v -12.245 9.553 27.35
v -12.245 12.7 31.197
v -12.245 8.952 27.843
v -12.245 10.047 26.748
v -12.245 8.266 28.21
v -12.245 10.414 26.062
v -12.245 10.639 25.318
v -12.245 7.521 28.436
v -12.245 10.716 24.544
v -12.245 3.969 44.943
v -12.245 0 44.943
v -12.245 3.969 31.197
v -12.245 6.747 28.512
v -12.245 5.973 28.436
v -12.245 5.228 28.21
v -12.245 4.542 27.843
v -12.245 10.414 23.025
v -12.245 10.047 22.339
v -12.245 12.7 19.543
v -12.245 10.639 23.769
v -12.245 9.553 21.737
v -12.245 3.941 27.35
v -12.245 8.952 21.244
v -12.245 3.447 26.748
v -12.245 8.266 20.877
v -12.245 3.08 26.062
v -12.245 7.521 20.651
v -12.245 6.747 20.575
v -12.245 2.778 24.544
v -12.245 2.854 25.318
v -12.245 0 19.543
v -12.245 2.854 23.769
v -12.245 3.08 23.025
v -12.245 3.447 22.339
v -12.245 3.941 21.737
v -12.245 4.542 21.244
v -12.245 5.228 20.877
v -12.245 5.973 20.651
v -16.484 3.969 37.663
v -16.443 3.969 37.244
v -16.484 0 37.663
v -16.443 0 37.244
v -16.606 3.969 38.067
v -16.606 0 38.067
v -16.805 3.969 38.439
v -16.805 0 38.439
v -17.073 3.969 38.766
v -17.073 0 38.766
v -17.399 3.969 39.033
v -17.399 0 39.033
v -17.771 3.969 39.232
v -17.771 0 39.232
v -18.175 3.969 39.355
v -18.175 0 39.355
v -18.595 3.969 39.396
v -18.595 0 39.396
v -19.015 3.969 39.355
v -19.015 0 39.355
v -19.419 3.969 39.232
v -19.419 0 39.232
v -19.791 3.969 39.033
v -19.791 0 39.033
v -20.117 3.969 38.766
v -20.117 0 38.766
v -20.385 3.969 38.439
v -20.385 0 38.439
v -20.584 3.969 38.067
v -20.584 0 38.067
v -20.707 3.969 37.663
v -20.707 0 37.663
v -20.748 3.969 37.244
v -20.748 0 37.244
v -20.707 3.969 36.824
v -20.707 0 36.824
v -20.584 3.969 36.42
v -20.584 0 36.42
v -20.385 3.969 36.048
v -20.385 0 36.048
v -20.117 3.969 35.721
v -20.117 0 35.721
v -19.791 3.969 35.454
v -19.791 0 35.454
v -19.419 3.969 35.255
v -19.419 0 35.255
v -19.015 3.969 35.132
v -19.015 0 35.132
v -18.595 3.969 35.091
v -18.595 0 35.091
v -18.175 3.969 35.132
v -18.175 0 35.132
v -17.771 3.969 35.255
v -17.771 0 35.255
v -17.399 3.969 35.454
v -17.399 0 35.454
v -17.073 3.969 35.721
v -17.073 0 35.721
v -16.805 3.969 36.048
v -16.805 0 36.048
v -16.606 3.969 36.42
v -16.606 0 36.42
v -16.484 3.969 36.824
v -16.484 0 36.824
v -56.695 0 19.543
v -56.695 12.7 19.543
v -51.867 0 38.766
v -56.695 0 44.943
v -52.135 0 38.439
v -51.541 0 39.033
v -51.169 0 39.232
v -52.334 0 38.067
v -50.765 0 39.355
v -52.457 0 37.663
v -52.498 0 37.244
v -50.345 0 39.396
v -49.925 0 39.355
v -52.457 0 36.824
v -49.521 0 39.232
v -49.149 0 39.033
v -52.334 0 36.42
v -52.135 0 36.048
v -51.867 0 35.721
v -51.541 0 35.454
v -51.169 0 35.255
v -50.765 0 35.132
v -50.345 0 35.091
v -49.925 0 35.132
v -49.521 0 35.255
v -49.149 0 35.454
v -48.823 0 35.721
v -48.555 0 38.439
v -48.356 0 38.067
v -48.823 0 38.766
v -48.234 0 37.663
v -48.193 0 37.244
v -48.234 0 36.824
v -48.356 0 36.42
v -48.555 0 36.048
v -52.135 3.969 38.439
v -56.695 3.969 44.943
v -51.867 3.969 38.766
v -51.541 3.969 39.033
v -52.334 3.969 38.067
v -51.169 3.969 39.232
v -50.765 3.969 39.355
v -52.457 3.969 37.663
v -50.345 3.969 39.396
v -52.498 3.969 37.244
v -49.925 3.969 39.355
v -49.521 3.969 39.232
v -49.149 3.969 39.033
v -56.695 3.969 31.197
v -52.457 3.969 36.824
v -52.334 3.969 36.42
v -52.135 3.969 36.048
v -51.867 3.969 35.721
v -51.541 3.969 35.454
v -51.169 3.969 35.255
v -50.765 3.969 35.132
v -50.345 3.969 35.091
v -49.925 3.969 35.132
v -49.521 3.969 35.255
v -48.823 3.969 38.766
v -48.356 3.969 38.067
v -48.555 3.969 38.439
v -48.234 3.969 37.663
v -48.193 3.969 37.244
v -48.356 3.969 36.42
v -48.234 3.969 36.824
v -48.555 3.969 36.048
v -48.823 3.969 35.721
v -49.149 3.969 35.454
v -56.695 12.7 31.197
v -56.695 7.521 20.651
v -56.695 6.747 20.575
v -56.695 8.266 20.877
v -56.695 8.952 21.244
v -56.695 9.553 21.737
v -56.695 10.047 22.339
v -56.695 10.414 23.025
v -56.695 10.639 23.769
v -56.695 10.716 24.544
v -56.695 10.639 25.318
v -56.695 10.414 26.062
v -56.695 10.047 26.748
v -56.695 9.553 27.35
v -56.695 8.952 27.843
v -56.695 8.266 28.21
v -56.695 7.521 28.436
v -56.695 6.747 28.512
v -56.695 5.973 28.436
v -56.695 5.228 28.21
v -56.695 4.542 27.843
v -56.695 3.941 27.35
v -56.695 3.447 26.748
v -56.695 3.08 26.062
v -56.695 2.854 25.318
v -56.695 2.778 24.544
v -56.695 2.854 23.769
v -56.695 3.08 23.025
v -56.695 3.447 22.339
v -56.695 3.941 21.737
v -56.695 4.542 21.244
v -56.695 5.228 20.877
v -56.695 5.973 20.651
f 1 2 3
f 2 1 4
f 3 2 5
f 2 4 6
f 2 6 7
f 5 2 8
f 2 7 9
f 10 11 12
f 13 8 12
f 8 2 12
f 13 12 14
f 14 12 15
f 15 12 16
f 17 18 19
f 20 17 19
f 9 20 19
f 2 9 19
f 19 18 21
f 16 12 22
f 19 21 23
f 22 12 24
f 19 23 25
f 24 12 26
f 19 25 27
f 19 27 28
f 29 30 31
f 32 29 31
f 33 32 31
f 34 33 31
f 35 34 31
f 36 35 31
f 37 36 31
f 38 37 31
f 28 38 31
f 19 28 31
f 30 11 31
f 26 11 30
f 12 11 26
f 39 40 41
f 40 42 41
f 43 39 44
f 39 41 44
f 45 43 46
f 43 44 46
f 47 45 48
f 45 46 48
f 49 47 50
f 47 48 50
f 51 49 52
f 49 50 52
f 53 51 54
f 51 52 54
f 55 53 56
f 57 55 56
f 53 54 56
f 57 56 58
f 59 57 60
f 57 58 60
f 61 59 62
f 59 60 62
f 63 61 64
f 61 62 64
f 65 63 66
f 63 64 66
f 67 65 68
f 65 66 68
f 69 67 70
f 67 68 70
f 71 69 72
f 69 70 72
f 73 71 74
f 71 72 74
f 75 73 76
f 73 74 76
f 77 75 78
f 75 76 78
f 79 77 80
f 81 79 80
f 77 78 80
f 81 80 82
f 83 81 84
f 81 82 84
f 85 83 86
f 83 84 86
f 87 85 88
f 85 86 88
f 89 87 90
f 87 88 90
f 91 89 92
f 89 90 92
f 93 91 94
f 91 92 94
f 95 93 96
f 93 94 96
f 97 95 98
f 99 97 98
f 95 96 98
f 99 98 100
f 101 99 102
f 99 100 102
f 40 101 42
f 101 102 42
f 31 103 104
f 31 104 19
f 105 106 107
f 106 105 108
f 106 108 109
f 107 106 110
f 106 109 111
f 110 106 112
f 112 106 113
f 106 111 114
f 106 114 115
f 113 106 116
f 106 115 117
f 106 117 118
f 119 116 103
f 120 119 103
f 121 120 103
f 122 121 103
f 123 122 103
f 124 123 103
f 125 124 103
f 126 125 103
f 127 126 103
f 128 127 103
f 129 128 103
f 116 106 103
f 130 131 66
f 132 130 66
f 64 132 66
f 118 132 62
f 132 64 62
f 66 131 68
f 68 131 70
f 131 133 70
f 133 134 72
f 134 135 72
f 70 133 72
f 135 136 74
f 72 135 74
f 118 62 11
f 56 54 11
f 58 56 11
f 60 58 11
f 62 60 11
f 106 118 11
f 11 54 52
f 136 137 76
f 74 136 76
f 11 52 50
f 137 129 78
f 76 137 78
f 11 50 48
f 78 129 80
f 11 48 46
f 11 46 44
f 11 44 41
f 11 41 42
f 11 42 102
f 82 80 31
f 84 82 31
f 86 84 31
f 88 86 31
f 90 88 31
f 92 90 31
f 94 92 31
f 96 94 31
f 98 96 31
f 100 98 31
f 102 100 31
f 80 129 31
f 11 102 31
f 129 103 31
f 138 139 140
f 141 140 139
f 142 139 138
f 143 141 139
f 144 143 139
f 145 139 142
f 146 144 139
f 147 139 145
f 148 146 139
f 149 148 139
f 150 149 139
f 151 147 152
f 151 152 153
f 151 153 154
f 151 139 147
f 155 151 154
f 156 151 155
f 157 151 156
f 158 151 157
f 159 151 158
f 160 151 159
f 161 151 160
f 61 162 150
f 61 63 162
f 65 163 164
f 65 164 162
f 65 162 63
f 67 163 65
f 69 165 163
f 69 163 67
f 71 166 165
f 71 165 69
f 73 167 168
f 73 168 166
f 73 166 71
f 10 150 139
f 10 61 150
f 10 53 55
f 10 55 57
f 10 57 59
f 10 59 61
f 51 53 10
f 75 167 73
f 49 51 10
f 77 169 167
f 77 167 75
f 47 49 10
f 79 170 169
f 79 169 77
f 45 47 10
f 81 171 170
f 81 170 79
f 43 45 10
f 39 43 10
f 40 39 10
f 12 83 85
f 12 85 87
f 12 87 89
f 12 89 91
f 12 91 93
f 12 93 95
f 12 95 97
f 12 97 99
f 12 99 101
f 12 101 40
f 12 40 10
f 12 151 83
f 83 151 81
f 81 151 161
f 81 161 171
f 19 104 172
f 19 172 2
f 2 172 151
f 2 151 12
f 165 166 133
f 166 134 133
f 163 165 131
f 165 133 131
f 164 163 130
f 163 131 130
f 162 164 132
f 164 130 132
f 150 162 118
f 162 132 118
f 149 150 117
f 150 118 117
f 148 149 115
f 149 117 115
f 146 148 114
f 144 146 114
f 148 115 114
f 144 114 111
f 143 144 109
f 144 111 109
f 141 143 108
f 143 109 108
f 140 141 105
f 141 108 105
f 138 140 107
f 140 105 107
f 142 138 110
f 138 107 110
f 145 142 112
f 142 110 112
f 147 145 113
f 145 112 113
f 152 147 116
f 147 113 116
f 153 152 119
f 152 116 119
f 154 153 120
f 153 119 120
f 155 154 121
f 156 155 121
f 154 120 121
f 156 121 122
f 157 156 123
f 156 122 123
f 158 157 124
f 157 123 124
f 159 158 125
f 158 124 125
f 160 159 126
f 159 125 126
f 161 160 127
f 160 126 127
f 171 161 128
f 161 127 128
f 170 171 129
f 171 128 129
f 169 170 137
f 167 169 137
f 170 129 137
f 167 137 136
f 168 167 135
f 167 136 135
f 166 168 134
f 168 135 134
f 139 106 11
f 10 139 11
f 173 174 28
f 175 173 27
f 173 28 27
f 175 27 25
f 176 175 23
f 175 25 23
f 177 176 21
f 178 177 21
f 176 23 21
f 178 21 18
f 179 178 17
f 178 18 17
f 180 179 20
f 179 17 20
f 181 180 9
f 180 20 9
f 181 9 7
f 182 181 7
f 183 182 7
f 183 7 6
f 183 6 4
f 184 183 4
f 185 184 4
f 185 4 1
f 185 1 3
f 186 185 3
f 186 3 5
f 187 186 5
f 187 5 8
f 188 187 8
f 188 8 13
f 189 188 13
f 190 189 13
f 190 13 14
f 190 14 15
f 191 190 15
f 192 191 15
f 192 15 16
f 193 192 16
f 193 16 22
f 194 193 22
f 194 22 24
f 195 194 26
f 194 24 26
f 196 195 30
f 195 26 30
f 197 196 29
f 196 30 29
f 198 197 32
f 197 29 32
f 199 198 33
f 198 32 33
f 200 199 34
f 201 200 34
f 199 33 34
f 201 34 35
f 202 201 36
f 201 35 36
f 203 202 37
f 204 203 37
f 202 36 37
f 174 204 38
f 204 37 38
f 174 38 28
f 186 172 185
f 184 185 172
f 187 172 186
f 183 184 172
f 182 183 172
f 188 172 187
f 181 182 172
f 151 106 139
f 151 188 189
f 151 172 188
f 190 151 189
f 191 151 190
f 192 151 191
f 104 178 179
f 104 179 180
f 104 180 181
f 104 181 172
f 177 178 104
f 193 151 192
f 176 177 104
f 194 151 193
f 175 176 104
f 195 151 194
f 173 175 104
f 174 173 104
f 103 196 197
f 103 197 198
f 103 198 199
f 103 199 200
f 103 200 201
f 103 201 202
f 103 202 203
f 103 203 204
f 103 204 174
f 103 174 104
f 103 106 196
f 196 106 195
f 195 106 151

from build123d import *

# Parameters (mm, degrees)
SKETCH1_W                        = 44.45
SKETCH1_H                        = 25.4
BOSS_EXTRUDE1_DEPTH              = 12.7
CUT_EXTRUDE1_REACH               = 46.45
SKETCH2_R                        = 3.96875
F_18_0_1695_DIAMETER_HOLE1_D     = 4.3053
F_18_0_1695_DIAMETER_HOLE1_DEPTH = 12.7
SKETCH5_W                        = 44.45
SKETCH5_H                        = 13.74547341
CUT_EXTRUDE2_DEPTH               = 8.73125


with BuildPart() as part:
    # Sketch1 → Boss-Extrude1 (new body)
    with BuildSketch(Plane(origin=(0, 0, 0), x_dir=(1, 0, 0), z_dir=(0, 1, 0))):
        with Locations((-34.470243637, -32.242582921)):
            Rectangle(SKETCH1_W, SKETCH1_H)
    extrude(amount=BOSS_EXTRUDE1_DEPTH)

    # Sketch2 → Cut-Extrude1 (cut, up to next)
    with BuildSketch(Plane(origin=(-12.245243637, 0, 0), x_dir=(0, 0, -1), z_dir=(1, 0, 0)), mode=Mode.PRIVATE) as cut_extrude1_sk1:
        with Locations((-24.543510458, 6.746875)):
            Circle(SKETCH2_R)
    cut_extrude1_tool1 = extrude(cut_extrude1_sk1.sketch, amount=-CUT_EXTRUDE1_REACH, mode=Mode.PRIVATE) & part.part
    add(cut_extrude1_tool1.solids().sort_by_distance((-12.245244, 6.746875, 24.54351))[0], mode=Mode.SUBTRACT)

    # #18 (0.1695) Diameter Hole1
    with Locations(Plane(origin=(0, 12.7, 0), x_dir=(-1, 0, 0), z_dir=(0, 1, 0))):
        with Locations((50.345243637, 37.243510458), (18.595243637, 37.243510458)):
            Hole(F_18_0_1695_DIAMETER_HOLE1_D / 2, depth=F_18_0_1695_DIAMETER_HOLE1_DEPTH)

    # Sketch5 → Cut-Extrude2 (cut)
    with BuildSketch(Plane(origin=(0, 12.7, 0), x_dir=(1, 0, 0), z_dir=(0, 1, 0))):
        with Locations((-34.470243637, -38.069846216)):
            Rectangle(SKETCH5_W, SKETCH5_H)
    extrude(amount=-CUT_EXTRUDE2_DEPTH, mode=Mode.SUBTRACT)


solid = part.part
